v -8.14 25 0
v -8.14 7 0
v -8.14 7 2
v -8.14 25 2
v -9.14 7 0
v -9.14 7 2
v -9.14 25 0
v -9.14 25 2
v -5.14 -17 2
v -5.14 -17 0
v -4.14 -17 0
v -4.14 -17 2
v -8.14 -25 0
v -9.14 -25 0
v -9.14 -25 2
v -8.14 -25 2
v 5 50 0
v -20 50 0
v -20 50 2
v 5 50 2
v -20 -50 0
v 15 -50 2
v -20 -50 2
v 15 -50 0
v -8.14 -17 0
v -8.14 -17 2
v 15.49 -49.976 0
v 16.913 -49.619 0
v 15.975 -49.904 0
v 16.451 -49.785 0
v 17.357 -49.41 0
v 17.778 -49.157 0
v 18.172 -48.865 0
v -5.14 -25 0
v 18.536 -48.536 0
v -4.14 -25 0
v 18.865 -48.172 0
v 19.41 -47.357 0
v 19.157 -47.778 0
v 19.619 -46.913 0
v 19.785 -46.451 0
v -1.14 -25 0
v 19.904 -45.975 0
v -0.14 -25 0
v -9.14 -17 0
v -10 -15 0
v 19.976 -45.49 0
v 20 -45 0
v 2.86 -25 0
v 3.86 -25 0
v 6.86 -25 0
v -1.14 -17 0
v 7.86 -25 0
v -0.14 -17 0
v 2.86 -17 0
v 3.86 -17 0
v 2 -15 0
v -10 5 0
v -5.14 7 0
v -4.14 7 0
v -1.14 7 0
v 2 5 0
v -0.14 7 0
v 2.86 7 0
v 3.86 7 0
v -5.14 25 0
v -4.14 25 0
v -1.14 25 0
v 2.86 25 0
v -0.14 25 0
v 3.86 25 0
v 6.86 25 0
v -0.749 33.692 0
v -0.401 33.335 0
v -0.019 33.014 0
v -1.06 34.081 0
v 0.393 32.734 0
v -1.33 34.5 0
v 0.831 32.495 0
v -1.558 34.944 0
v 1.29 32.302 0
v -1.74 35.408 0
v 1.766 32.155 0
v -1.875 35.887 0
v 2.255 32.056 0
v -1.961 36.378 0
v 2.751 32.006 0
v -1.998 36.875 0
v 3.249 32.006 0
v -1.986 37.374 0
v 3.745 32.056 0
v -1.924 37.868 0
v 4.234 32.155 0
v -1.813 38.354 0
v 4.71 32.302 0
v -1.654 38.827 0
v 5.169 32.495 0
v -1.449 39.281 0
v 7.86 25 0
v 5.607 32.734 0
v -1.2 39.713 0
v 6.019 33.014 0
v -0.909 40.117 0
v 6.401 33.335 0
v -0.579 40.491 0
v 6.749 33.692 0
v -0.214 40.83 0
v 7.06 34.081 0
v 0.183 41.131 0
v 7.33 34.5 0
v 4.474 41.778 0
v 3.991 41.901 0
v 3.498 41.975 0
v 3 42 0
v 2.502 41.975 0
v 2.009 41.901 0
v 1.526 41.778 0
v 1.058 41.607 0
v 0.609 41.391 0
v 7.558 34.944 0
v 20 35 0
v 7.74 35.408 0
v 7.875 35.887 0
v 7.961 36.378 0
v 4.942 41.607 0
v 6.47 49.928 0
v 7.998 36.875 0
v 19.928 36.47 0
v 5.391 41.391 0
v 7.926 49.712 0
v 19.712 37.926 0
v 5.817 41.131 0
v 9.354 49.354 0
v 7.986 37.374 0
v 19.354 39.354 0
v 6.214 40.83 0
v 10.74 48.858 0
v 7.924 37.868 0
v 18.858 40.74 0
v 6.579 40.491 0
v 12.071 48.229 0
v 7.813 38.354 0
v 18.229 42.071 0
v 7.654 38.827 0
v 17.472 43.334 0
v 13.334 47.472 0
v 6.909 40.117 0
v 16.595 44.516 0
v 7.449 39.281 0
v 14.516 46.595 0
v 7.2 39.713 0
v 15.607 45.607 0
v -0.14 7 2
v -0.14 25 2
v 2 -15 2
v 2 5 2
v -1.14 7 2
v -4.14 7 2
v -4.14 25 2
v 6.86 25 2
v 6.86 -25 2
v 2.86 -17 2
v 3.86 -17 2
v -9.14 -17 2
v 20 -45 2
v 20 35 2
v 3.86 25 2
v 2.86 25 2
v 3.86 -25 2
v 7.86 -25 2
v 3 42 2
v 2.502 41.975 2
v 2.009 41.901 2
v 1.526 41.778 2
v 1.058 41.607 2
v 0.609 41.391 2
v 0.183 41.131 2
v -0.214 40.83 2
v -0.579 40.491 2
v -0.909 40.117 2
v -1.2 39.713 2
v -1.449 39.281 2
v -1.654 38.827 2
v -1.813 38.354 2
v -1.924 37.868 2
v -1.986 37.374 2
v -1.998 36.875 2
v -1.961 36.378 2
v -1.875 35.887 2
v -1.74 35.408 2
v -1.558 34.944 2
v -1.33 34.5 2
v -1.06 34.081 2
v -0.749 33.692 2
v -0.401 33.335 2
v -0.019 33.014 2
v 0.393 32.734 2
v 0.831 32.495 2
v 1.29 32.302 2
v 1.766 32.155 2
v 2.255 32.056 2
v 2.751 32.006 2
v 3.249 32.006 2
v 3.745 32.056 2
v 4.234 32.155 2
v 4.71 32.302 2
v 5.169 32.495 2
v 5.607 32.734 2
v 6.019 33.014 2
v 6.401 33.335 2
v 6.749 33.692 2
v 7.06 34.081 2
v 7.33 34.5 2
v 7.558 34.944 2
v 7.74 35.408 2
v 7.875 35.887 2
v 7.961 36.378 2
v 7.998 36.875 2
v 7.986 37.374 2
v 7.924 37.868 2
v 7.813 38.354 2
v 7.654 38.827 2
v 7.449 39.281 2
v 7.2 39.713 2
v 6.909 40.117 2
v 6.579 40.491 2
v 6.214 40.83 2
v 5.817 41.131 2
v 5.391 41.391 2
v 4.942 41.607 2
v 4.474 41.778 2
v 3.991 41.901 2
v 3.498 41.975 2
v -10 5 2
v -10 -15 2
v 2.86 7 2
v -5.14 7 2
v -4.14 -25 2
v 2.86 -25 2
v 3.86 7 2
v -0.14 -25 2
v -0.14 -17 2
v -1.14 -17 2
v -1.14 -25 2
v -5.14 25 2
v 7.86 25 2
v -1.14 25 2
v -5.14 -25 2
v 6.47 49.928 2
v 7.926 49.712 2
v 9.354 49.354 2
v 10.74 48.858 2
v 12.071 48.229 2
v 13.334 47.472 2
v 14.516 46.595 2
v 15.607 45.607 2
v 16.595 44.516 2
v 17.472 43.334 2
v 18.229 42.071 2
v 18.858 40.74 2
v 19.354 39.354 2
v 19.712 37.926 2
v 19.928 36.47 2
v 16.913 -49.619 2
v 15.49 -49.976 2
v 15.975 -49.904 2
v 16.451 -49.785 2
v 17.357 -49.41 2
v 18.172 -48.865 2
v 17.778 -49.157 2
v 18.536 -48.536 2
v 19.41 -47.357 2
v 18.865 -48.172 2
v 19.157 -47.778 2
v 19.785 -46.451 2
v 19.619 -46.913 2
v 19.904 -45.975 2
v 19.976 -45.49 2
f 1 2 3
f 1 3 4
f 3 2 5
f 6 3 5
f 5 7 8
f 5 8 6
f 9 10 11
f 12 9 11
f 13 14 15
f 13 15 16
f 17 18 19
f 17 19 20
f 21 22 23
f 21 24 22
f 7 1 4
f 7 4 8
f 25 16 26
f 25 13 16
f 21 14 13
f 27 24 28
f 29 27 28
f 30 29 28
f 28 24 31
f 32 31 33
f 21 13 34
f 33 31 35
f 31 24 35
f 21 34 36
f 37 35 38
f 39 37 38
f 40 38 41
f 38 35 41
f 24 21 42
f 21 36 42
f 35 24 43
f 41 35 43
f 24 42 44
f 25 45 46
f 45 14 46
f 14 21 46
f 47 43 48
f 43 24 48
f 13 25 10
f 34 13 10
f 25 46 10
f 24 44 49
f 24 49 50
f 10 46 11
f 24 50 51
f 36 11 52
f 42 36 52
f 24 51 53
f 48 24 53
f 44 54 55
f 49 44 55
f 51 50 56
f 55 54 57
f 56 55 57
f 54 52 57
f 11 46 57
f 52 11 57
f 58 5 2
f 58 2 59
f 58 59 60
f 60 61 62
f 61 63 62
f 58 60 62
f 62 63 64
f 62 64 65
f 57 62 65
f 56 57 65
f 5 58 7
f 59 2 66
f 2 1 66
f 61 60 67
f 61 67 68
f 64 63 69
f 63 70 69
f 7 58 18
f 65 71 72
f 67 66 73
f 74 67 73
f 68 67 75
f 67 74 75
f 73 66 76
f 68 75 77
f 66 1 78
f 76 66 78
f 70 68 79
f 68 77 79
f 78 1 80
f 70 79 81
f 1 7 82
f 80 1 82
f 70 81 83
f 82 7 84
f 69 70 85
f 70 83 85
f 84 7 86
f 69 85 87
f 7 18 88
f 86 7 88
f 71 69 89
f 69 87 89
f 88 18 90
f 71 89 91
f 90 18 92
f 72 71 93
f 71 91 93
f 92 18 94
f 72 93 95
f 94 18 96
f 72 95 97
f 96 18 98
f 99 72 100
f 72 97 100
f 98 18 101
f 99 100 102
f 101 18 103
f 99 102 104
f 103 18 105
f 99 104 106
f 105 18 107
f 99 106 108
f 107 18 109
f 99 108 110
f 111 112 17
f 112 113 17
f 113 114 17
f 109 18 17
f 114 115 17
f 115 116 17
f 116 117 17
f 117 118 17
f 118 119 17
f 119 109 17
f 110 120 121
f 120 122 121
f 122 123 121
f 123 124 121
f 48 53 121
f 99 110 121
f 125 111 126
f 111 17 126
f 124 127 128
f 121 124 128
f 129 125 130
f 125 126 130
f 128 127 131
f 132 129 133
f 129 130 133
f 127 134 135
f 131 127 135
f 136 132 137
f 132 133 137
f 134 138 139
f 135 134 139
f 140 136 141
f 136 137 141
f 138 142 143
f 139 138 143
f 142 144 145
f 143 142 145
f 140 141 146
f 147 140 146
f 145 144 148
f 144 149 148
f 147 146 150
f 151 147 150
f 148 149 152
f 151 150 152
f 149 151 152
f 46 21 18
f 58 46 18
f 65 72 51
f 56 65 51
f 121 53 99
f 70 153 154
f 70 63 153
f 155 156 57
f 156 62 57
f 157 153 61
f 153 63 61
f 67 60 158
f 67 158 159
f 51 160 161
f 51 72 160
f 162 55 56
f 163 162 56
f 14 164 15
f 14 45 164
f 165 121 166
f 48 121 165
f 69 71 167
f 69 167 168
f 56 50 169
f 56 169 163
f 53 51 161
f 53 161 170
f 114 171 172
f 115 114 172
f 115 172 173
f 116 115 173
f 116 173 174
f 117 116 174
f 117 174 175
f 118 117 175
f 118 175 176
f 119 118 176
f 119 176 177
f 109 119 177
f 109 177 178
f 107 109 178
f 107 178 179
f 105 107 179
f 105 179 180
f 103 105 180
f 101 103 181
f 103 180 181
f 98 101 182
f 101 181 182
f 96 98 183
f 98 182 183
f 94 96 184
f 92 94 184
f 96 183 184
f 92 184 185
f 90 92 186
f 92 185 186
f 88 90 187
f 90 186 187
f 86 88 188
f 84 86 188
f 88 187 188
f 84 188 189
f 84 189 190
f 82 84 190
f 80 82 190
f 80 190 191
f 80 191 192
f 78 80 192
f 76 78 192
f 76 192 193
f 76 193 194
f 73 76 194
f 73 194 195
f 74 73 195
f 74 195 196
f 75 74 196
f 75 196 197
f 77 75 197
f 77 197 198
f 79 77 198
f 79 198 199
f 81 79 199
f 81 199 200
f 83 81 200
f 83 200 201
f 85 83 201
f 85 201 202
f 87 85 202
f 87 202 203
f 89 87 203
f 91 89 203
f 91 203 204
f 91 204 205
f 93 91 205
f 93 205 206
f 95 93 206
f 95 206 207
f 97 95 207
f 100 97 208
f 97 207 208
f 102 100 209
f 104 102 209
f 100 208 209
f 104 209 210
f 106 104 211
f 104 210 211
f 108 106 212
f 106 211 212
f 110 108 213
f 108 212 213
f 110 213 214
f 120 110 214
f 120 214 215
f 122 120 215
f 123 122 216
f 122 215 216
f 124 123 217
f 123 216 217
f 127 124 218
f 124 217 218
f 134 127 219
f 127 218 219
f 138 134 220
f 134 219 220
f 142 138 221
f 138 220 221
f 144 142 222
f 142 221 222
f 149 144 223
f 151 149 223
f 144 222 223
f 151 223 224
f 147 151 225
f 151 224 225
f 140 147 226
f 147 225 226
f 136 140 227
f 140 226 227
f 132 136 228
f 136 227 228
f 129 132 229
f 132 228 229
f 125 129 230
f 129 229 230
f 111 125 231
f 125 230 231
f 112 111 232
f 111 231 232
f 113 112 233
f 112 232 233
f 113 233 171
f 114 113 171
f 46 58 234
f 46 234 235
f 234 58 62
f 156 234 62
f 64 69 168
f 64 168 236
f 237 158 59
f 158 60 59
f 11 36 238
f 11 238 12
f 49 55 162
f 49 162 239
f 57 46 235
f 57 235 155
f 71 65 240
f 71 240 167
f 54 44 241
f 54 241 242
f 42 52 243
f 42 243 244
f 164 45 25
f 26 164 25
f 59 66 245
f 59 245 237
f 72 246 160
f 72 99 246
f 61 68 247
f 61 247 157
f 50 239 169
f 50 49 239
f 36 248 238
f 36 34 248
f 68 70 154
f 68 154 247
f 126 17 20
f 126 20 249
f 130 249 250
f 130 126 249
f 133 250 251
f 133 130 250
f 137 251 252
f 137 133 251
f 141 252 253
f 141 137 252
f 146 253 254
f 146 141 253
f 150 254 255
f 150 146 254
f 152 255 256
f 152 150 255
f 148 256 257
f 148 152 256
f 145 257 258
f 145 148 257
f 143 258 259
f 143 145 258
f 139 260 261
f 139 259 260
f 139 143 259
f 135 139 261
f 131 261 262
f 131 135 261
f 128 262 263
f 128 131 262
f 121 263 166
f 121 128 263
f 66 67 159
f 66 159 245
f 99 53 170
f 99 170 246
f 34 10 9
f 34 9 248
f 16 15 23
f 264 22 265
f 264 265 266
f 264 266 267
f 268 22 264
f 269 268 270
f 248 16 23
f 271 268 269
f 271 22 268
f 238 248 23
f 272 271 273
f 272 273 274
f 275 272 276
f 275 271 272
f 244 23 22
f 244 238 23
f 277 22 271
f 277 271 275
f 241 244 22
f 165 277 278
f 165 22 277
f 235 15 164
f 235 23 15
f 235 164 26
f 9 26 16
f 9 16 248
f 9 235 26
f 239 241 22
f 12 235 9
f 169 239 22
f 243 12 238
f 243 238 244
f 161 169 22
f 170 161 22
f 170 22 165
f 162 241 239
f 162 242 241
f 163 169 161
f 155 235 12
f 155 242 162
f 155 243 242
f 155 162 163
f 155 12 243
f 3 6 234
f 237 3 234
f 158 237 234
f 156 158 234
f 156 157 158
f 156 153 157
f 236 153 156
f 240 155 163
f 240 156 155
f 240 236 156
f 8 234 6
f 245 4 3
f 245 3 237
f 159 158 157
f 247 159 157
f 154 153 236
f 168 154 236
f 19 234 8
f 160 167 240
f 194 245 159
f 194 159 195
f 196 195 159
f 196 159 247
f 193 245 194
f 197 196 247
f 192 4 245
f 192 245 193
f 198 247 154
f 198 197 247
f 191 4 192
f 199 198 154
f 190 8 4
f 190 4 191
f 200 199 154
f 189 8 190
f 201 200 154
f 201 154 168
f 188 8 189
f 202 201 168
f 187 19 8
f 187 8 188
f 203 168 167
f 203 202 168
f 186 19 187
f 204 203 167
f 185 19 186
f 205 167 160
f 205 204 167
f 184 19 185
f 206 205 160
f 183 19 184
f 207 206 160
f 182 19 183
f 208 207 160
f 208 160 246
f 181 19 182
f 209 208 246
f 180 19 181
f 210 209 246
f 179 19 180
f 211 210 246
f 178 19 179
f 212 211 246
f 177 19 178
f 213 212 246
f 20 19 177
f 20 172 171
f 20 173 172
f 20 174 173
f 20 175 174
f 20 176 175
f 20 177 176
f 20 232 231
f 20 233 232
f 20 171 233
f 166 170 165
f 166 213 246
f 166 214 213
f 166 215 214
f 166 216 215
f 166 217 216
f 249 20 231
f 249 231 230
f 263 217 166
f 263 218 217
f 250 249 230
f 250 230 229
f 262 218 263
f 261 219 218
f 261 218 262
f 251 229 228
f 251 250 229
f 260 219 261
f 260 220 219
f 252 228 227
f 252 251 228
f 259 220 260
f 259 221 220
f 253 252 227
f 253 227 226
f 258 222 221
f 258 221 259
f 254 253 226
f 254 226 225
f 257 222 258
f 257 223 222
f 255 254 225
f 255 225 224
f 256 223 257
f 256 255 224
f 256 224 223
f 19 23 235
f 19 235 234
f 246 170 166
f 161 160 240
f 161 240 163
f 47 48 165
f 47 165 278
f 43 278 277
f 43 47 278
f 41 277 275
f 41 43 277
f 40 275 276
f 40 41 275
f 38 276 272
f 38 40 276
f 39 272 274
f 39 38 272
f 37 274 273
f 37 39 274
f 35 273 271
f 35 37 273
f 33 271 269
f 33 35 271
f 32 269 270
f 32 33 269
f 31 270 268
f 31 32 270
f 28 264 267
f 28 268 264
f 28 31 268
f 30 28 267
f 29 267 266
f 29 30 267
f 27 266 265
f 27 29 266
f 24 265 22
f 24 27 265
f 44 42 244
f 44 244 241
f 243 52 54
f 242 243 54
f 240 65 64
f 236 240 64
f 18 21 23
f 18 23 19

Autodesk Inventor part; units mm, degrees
ref_plane "YZ Plane" through (0, 0, 0) normal (1, 0, 0) x (0, 1, 0)
ref_plane "XZ Plane" through (0, 0, 0) normal (0, 1, 0) x (-1, 0, 0)
ref_plane "XY Plane" through (0, 0, 0) normal (0, 0, 1) x (1, 0, 0)
sketch "Boceto1" plane through (0, 0, 0) normal (0, 0, 1) x (1, 0, 0)
  line L0 (-20, 50) -> (5, 50)
  line L1 (20, 35) -> (20, -45)
  line L2 (15, -50) -> (-20, -50)
  line L3 (-20, -50) -> (-20, 50)
  line L4 (0, 26.3033) -> (0, -44.8052)
  line L5 (-41.9778, 0) -> (28.2031, 0)
  arc A0 (20, 35) -> (5, 50) centre (5, 35) ccw
  arc A1 (15, -50) -> (20, -45) centre (15, -45) ccw
  point P0 (0, 0)
  point P1 (0, 50)
  point P2 (-20, 0)
  dimension "d3" = 30
  dimension "d4" = 10
  dimension "d5" = 100
  dimension "d6" = 40
extrude "Extrusión1" add sketch "Boceto1" along normal blind 2
sketch "Boceto2" plane through (0, 0, 2) normal (0, 0, 1) x (1, 0, 0)
  line L0 (-20, -50) -> (15, -50) projected
  line L1 (20, -45) -> (20, 35) projected
  line L2 (5, 50) -> (-20, 50) projected
  line L3 (-20, 50) -> (-20, -50) projected
  circle A0 centre (-10, 47.5) radius 1
  circle A1 centre (17.5, 35) radius 1
  circle A2 centre (17.5, 15) radius 1
  circle A3 centre (17.5, -5) radius 1
  circle A4 centre (17.5, -25) radius 1
  circle A5 centre (17.5, -45) radius 1
  circle A6 centre (-15, -47.5) radius 1
  point P0 (0, 0)
  dimension "d9" = 2.5
  dimension "d10" = 5
  dimension "d11" = 5
  dimension "d12" = 2.5
  dimension "d13" = 2.5
  dimension "d14" = 2.5
  dimension "d15" = 2.5
  dimension "d16" = 2.5
  dimension "d17" = 10
  dimension "d18" = 20
  dimension "d19" = 20
  dimension "d20" = 20
  dimension "d21" = 2.5
  dimension "d22" = 20
  dimension "d23" = 2
  dimension "d24" = 2
  dimension "d25" = 2
  dimension "d26" = 2
  dimension "d27" = 2
  dimension "d28" = 2
  dimension "d29" = 2
extrude "Extrusión2" [suppressed]
sketch "Boceto3" plane through (0, 0, 0) normal (0, 0, -1) x (-1, 0, 0)
  line L0 (20, -50) -> (20, 50) projected
  line L1 (20, 50) -> (-5, 50) projected
  point P0 (0, 0)
  point P1 (-3, 37)
  dimension "d32" = 23
  dimension "d33" = 13
hole "Agujero1" at (3, 37, 0) direction (0, 0, 1) diameter 10 end through all
sketch "Boceto4" plane through (0, 0, 0) normal (0, 0, 1) x (1, 0, 0)
  line L0 (-8.1395, 25) -> (-9.1395, 25)
  line L1 (-9.1395, 25) -> (-9.1395, -25)
  line L2 (-9.1395, -25) -> (-8.1395, -25)
  line L3 (-8.1395, -25) -> (-8.1395, 25)
  line L4 (-48.3206, 0) -> (41.5333, 0)
  line L5 (-4.1395, 25) -> (-5.1395, 25)
  line L6 (-5.1395, 25) -> (-5.1395, -25)
  line L7 (-5.1395, -25) -> (-4.1395, -25)
  line L8 (-4.1395, -25) -> (-4.1395, 25)
  line L9 (-0.1395, 25) -> (-1.1395, 25)
  line L10 (-1.1395, 25) -> (-1.1395, -25)
  line L11 (-1.1395, -25) -> (-0.1395, -25)
  line L12 (-0.1395, -25) -> (-0.1395, 25)
  line L13 (3.8605, 25) -> (2.8605, 25)
  line L14 (2.8605, 25) -> (2.8605, -25)
  line L15 (2.8605, -25) -> (3.8605, -25)
  line L16 (3.8605, -25) -> (3.8605, 25)
  line L17 (7.8605, 25) -> (6.8605, 25)
  line L18 (6.8605, 25) -> (6.8605, -25)
  line L19 (6.8605, -25) -> (7.8605, -25)
  line L20 (7.8605, -25) -> (7.8605, 25)
  point P0 (0, 0)
  point P1 (-9.1395, 0)
  dimension "d41" = 1
  dimension "d42" = 50
  dimension "d43" = 1
  dimension "d44" = 50
  dimension "d45" = 1
  dimension "d46" = 50
  dimension "d47" = 1
  dimension "d48" = 50
  dimension "d49" = 1
  dimension "d50" = 50
  dimension "d51" = 3
  dimension "d52" = 3
  dimension "d53" = 3
  dimension "d54" = 3
extrude "Extrusión3" cut sketch "Boceto4" along normal blind 10
sketch "Boceto5" plane through (0, 0, 0) normal (0, 0, 1) x (1, 0, 0)
  line L0 (5, 50) -> (-20, 50) projected
  line L1 (20, -45) -> (20, 35) projected
  line L2 (-20, -50) -> (-20, 50) projected
  line L3 (2, 63.3665) -> (2, 50)
  line L4 (2, 5) -> (2, -15)
  line L5 (-10, 55.864) -> (-10, 50)
  line L6 (-10, 5) -> (-10, -15)
  line L7 (-56.3903, 5) -> (-20, 5)
  line L8 (-10, 5) -> (2, 5)
  line L9 (20, 5) -> (36.1498, 5)
  line L10 (20, -15) -> (39.7486, -15)
  line L11 (-56.3903, -15) -> (-20, -15)
  line L12 (-10, -15) -> (2, -15)
  point P0 (0, 0)
  dimension "d61" = 10
  dimension "d62" = 20
  dimension "d63" = 45
  dimension "d64" = 12
extrude "Extrusión4" cut sketch "Boceto5" along normal blind 10
sketch "Boceto6" plane through (0, 0, 0) normal (0, 0, 1) x (1, 0, 0)
  line L0 (-10, -15) -> (2, -15)
  line L1 (2, -15) -> (2, 5)
  line L2 (2, 5) -> (-10, 5)
  line L3 (-10, 5) -> (-10, -15)
  line L4 (-12, -17) -> (4, -17)
  line L5 (4, -17) -> (4, 7)
  line L6 (4, 7) -> (-12, 7)
  line L7 (-12, 7) -> (-12, -17)
  point P0 (0, 0)
  point P1 (2, -15)
  point P2 (-10, 5)
  dimension "d67" = 2
extrude "Extrusión5" add sketch "Boceto6" along normal up to surface (2 mm away)
properties part number "base_lateral_cover_rigth_v2" material "Plástico ABS"
